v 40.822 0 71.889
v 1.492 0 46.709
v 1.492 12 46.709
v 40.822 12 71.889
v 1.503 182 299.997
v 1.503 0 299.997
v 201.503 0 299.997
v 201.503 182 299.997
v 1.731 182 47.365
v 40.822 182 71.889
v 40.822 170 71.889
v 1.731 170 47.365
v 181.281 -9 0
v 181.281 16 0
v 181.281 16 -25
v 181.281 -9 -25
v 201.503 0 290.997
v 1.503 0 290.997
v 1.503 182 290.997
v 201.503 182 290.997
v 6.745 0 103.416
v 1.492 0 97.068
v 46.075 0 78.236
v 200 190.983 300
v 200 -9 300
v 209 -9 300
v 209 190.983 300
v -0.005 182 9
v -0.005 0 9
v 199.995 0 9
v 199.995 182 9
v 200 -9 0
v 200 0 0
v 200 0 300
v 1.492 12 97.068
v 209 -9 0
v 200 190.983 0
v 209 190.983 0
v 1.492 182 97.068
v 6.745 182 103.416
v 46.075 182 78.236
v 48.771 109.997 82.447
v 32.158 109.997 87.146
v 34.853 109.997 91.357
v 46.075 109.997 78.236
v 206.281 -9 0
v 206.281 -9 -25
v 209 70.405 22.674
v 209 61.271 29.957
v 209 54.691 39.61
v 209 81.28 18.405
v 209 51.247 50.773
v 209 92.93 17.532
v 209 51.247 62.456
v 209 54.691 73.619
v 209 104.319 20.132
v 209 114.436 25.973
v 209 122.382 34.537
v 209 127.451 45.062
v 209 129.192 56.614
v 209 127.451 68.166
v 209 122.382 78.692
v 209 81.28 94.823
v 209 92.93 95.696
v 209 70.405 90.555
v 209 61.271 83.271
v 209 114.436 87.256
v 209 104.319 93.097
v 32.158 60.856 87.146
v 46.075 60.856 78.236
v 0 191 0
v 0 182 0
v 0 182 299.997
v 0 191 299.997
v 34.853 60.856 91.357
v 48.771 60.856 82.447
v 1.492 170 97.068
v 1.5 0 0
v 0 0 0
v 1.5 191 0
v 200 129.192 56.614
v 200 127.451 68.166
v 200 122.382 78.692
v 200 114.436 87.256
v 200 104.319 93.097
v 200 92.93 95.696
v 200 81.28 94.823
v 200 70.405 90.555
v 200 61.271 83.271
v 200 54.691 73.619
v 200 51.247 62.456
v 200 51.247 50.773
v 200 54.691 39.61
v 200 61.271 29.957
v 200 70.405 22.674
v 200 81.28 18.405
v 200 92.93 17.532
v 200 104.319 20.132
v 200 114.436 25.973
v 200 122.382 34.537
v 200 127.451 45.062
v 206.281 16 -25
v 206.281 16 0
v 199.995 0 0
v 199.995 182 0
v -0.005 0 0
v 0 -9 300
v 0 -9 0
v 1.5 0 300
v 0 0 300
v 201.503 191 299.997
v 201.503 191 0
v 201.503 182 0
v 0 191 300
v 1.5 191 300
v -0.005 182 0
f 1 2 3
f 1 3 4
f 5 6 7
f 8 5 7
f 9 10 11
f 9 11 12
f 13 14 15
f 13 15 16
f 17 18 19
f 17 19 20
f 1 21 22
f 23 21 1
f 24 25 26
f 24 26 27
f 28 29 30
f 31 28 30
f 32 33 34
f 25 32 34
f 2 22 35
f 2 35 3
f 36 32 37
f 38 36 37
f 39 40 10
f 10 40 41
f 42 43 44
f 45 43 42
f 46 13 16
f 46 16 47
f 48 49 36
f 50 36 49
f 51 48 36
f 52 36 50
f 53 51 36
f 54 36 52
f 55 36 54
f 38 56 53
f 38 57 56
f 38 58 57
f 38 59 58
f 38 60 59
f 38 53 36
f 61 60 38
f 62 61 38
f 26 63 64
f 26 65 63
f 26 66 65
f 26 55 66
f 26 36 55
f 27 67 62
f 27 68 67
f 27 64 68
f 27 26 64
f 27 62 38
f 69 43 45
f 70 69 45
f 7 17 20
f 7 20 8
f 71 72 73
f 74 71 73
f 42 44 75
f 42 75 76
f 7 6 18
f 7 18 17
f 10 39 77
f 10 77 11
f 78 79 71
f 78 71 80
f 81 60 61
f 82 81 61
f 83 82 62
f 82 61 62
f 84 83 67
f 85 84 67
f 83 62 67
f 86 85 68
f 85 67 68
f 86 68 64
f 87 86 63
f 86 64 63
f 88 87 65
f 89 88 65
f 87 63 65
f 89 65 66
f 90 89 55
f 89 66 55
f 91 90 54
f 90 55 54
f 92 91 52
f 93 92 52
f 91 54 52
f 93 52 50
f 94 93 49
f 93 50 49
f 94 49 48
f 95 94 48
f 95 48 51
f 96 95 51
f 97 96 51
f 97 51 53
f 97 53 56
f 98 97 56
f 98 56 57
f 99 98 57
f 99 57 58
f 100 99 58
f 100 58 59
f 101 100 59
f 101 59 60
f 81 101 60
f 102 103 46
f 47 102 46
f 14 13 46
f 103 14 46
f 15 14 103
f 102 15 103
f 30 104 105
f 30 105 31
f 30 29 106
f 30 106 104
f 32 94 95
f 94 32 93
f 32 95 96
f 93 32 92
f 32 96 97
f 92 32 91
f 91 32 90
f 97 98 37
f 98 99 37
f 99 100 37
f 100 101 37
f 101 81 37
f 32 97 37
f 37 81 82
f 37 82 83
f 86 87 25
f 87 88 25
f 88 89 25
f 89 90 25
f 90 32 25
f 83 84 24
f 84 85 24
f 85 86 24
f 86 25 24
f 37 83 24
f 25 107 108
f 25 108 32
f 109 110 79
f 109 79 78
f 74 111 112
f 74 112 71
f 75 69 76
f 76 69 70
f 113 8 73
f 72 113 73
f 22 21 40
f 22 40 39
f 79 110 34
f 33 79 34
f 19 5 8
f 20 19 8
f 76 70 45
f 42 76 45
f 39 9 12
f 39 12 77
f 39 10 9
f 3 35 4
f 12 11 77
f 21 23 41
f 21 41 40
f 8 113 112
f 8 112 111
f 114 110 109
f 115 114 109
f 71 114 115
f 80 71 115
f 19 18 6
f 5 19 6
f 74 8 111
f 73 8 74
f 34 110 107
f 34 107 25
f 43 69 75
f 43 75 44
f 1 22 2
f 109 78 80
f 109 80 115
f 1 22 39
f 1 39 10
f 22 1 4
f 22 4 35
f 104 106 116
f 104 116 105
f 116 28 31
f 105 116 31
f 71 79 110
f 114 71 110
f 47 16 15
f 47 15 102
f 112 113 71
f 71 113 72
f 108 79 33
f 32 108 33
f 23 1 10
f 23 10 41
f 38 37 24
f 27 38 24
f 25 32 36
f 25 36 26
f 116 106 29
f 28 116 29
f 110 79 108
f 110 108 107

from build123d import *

# Parameters (mm, degrees)
F0_W      = 200
F0_H      = 300
F1_DEPTH  = 9
F2_W      = 1.5
F2_H      = 300
F3_DEPTH  = 191
F5_DEPTH  = 12
F7_DEPTH  = 182
F9_DEPTH  = 12
F10_W     = 16.525515
F10_H     = 49.141772
F11_DEPTH = 5
F12_W     = 200
F12_H     = 9
F13_DEPTH = 182
F14_W     = 200
F14_H     = 9
F15_DEPTH = 182
F16_W     = 201.503396
F16_H     = 299.997134
F17_DEPTH = 9
F18_W     = 199.982908
F18_H     = 300
F19_DEPTH = 9
F20_R     = 39.191546
F21_DEPTH = 30
F22_W     = 25
F22_H     = 25
F23_DEPTH = 25


with BuildPart() as f1:
    # F0 (on Front) → F1 (new body)
    with BuildSketch(Plane.XZ):
        with Locations((100, 150)):
            Rectangle(F0_W, F0_H)
    extrude(amount=F1_DEPTH)


with BuildPart() as f3:
    # F2 (on Front) → F3 (new body)
    with BuildSketch(Plane.XZ):
        with Locations((0.75, 150)):
            Rectangle(F2_W, F2_H)
    extrude(amount=-F3_DEPTH)


with BuildPart() as f5:
    # F4 (on face) → F5 (new body)
    with BuildSketch(Plane.XZ):
        Polygon((40.822188, 71.888947), (1.491757, 97.068447), (1.491757, 46.709447), align=None)
    extrude(amount=-F5_DEPTH)


with BuildPart() as f7:
    # F6 (on face) → F7 (new body)
    with BuildSketch(Plane.XZ):
        Polygon((6.744769, 103.415835), (1.491757, 97.068447), (40.822188, 71.888947), (46.0752, 78.236335), align=None)
    extrude(amount=-F7_DEPTH)


with BuildPart() as f9:
    # F8 (on face) → F9 (new body)
    with BuildSketch(Plane(origin=(0, 182, 0), x_dir=(-1, 0, 0), z_dir=(0, 1, 0))):
        Polygon((-1.491757, 97.068447), (-40.822188, 71.888947), (-1.731334, 47.364518), align=None)
    extrude(amount=-F9_DEPTH)


with BuildPart() as f11:
    # F10 (on face) → F11 (new body)
    with BuildSketch(Plane(origin=(48.920882, 0, 76.414518), x_dir=(0.842193, 0, -0.539176), z_dir=(0.539176, 0, 0.842193))):
        with Locations((-11.641651, 85.426528)):
            Rectangle(F10_W, F10_H)
    extrude(amount=F11_DEPTH)


with BuildPart() as f13:
    # F12 (on face) → F13 (new body)
    with BuildSketch(Plane.XZ):
        with Locations((101.503396, 295.497134)):
            Rectangle(F12_W, F12_H)
    extrude(amount=-F13_DEPTH)


with BuildPart() as f15:
    # F14 (on face) → F15 (new body)
    with BuildSketch(Plane.XZ):
        with Locations((99.995469, 4.5)):
            Rectangle(F14_W, F14_H)
    extrude(amount=-F15_DEPTH)


with BuildPart() as f17:
    # F16 (on face) → F17 (new body)
    with BuildSketch(Plane(origin=(0, 182, 0), x_dir=(-1, 0, 0), z_dir=(0, 1, 0))):
        with Locations((-100.751698, 149.998567)):
            Rectangle(F16_W, F16_H)
    extrude(amount=F17_DEPTH)


with BuildPart() as f19:
    # F18 (on face) → F19 (new body)
    with BuildSketch(Plane.YZ.offset(200)):
        with Locations((90.991454, 150)):
            Rectangle(F18_W, F18_H)
    extrude(amount=F19_DEPTH)

    # F20 (on face) → F21 (cut)
    with BuildSketch(Plane.YZ.offset(209)):
        with Locations((90.000883, 56.614403)):
            Circle(F20_R)
    extrude(amount=-F21_DEPTH, mode=Mode.SUBTRACT)


with BuildPart() as f23:
    # F22 (on face) → F23 (new body)
    with BuildSketch(Plane(origin=(0, 0, 0), x_dir=(1, 0, 0), z_dir=(0, 0, -1))):
        with Locations((193.781105, -3.5)):
            Rectangle(F22_W, F22_H)
    extrude(amount=F23_DEPTH)


solid = Compound([f1.part, f3.part, f5.part, f7.part, f9.part, f11.part, f13.part, f15.part, f17.part, f19.part, f23.part])
